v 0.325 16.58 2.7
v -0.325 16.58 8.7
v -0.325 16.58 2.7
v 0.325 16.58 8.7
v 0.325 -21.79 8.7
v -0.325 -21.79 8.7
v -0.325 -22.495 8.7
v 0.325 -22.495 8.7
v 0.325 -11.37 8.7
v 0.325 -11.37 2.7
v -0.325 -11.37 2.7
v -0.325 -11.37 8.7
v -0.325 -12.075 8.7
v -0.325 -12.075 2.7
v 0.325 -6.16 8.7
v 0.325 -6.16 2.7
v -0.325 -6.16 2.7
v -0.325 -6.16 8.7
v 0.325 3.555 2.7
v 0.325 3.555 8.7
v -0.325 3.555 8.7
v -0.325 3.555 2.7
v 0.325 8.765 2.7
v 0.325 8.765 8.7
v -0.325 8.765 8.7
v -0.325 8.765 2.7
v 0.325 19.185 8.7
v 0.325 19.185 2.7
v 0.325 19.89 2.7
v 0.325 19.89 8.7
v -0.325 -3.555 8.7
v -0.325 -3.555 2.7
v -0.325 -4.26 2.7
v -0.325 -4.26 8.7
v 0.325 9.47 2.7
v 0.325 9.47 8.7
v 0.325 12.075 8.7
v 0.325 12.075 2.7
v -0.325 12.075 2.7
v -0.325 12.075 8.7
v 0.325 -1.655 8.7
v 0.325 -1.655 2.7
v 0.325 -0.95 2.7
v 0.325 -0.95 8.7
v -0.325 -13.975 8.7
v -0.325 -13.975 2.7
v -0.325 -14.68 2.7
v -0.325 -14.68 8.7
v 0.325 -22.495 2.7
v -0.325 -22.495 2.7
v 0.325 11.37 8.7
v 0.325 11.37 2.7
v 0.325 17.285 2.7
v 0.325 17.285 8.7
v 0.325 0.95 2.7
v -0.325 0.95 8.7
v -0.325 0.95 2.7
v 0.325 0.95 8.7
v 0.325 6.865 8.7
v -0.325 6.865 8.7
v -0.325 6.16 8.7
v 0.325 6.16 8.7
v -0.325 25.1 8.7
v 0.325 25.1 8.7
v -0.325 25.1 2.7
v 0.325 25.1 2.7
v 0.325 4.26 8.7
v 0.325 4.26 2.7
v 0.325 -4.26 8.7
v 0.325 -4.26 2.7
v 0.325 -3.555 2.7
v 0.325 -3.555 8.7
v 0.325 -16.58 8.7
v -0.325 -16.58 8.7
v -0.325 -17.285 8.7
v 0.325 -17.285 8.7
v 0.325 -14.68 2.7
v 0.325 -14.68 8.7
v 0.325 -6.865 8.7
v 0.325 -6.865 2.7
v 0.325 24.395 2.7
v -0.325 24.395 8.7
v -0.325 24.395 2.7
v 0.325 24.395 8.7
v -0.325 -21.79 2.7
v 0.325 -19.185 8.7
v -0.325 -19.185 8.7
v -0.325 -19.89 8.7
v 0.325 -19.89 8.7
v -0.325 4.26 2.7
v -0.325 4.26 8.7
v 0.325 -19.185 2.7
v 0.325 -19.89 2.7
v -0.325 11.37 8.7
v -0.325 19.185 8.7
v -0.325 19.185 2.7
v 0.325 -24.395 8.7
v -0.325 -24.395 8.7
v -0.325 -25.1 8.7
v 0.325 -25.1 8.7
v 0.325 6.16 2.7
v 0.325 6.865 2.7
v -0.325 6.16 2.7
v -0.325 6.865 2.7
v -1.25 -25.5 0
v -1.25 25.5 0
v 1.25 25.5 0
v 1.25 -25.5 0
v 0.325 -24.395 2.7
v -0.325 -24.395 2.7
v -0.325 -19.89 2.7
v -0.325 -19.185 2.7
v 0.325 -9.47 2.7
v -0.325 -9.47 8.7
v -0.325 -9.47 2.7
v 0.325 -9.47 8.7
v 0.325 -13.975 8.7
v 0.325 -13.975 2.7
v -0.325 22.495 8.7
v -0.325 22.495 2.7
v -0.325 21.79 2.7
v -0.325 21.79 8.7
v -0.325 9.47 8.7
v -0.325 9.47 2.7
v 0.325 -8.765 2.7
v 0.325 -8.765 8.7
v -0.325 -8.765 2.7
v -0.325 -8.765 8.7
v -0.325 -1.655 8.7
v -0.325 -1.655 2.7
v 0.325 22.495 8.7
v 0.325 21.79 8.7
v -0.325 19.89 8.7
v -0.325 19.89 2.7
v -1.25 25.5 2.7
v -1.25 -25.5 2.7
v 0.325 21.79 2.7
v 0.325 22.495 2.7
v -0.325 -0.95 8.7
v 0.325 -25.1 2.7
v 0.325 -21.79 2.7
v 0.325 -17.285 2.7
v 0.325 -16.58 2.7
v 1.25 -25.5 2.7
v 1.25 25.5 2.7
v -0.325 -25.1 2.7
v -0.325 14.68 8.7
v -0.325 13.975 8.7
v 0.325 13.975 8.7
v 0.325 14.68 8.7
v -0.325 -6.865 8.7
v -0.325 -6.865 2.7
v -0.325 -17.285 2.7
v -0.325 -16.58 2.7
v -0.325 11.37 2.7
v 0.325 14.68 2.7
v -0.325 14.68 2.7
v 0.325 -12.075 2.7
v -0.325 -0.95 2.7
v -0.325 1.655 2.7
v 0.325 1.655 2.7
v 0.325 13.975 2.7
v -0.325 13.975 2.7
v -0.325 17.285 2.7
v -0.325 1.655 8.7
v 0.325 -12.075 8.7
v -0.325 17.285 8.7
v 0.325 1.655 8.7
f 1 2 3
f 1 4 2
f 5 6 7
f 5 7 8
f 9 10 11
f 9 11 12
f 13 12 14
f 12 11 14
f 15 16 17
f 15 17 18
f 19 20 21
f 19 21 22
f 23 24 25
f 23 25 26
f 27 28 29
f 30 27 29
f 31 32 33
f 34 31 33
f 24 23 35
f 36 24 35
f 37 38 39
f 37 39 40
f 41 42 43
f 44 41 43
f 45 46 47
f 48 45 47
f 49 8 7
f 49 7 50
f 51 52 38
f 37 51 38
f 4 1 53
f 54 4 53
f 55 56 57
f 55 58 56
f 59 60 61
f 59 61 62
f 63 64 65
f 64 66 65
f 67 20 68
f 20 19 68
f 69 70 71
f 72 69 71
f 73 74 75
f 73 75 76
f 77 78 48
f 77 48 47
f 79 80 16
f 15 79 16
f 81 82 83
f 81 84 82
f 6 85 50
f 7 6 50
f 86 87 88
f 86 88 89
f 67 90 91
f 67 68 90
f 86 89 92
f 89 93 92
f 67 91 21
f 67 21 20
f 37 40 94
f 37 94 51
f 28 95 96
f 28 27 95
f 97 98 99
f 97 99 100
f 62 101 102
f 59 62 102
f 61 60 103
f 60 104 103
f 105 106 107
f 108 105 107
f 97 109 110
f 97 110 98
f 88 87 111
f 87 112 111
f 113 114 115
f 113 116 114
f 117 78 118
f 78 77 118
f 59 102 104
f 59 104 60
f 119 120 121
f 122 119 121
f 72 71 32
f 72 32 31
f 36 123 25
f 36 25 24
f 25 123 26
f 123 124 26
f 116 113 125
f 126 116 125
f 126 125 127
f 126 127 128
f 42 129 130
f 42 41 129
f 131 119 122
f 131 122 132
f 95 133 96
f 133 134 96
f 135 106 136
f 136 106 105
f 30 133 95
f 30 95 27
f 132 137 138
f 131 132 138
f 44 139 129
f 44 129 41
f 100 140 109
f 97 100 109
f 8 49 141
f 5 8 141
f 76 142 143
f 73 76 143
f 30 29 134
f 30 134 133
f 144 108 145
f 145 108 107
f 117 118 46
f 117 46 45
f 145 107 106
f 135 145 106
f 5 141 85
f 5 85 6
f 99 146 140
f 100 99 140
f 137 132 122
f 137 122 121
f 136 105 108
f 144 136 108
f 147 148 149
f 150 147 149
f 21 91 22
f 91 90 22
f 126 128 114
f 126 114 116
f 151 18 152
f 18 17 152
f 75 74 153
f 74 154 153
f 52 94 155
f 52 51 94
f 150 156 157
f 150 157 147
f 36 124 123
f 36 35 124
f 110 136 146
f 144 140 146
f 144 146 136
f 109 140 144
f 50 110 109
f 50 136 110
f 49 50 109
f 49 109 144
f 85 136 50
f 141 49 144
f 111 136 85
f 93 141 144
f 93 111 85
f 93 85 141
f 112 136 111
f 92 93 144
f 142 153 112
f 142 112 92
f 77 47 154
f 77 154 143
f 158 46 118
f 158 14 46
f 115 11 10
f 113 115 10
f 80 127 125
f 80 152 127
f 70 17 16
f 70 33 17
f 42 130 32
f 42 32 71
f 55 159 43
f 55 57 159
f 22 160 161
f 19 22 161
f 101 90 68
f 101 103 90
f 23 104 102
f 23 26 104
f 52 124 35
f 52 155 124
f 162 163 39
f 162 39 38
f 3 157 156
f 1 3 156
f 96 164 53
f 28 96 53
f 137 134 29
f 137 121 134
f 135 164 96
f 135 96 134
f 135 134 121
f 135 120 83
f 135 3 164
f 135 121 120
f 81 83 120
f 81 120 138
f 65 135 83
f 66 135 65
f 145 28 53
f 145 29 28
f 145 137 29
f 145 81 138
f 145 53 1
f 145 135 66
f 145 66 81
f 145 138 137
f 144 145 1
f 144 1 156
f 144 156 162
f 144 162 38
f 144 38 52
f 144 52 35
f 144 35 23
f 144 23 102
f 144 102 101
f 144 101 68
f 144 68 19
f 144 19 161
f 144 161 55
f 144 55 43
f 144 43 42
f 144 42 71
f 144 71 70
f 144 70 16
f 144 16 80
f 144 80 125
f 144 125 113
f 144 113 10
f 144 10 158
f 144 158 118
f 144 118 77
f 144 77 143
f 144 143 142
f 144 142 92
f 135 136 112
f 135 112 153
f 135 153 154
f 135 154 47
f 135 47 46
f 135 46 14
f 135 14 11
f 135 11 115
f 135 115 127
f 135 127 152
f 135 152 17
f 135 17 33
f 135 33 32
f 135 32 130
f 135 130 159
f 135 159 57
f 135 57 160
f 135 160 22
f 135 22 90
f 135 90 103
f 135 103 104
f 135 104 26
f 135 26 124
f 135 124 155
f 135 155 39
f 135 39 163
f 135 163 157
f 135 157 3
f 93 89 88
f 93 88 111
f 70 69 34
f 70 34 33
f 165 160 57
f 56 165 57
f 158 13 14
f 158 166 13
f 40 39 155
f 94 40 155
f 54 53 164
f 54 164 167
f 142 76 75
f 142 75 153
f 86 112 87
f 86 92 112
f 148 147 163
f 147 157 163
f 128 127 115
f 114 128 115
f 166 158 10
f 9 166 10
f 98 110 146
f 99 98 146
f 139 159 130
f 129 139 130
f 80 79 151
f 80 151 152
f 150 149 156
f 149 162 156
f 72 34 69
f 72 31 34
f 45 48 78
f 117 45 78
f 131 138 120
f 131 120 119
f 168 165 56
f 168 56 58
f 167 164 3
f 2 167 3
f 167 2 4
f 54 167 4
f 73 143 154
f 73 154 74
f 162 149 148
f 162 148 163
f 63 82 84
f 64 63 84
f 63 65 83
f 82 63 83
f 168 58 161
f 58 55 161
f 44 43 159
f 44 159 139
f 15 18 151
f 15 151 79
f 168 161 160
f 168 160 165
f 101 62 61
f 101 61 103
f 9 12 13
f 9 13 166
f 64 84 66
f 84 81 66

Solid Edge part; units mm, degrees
sketch "Sketch1" plane through (0, 0, 0) normal (0, 0, 1) x (1, 0, 0)
  line L0 (-1.25, -25.5) -> (1.25, -25.5)
  line L1 (1.25, -25.5) -> (1.25, 25.5)
  line L2 (1.25, 25.5) -> (-1.25, 25.5)
  line L3 (-1.25, 25.5) -> (-1.25, -25.5)
  dimension "D1" = 2.5
  dimension "D2" = 51
extrude "Protrusion1" add sketch "Sketch1" along normal blind 2.7
sketch "Sketch2" plane through (0, 0, 2.7) normal (0, 0, 1) x (0, 1, 0)
  line L0 (-25.1, -0.325) -> (25.1, -0.325)
  line L1 (25.1, -0.325) -> (25.1, 0.325)
  line L2 (25.1, 0.325) -> (-25.1, 0.325)
  line L3 (-25.1, 0.325) -> (-25.1, -0.325)
  dimension "D1" = 0.65
  dimension "D2" = 50.2
extrude "Extrusionsausprägung_2" add sketch "Sketch2" along normal blind 6
sketch "Sketch3" plane through (0.325, 0, 5.7) normal (1, 0, 0) x (0, 1, 0)
  line L0 (-21.79, 3) -> (-19.89, 3)
  line L1 (-19.89, 3) -> (-19.89, -3)
  line L2 (-19.89, -3) -> (-21.79, -3)
  line L3 (-21.79, -3) -> (-21.79, 3)
  line L4 (-19.185, 3) -> (-17.285, 3)
  line L5 (-17.285, 3) -> (-17.285, -3)
  line L6 (-17.285, -3) -> (-19.185, -3)
  line L7 (-19.185, -3) -> (-19.185, 3)
  line L8 (-16.58, 3) -> (-14.68, 3)
  line L9 (-14.68, 3) -> (-14.68, -3)
  line L10 (-14.68, -3) -> (-16.58, -3)
  line L11 (-16.58, -3) -> (-16.58, 3)
  line L12 (-13.975, 3) -> (-12.075, 3)
  line L13 (-12.075, 3) -> (-12.075, -3)
  line L14 (-12.075, -3) -> (-13.975, -3)
  line L15 (-13.975, -3) -> (-13.975, 3)
  line L16 (-11.37, 3) -> (-9.47, 3)
  line L17 (-9.47, 3) -> (-9.47, -3)
  line L18 (-9.47, -3) -> (-11.37, -3)
  line L19 (-11.37, -3) -> (-11.37, 3)
  line L20 (-8.765, 3) -> (-6.865, 3)
  line L21 (-6.865, 3) -> (-6.865, -3)
  line L22 (-6.865, -3) -> (-8.765, -3)
  line L23 (-8.765, -3) -> (-8.765, 3)
  line L24 (-6.16, 3) -> (-4.26, 3)
  line L25 (-4.26, 3) -> (-4.26, -3)
  line L26 (-4.26, -3) -> (-6.16, -3)
  line L27 (-6.16, -3) -> (-6.16, 3)
  line L28 (-3.555, 3) -> (-1.655, 3)
  line L29 (-1.655, 3) -> (-1.655, -3)
  line L30 (-1.655, -3) -> (-3.555, -3)
  line L31 (-3.555, -3) -> (-3.555, 3)
  line L32 (-0.95, 3) -> (0.95, 3)
  line L33 (0.95, 3) -> (0.95, -3)
  line L34 (0.95, -3) -> (-0.95, -3)
  line L35 (-0.95, -3) -> (-0.95, 3)
  line L36 (-24.395, 3) -> (-22.495, 3)
  line L37 (-22.495, 3) -> (-22.495, -3)
  line L38 (-22.495, -3) -> (-24.395, -3)
  line L39 (-24.395, -3) -> (-24.395, 3)
  dimension "D1" = 0.705
  dimension "D2" = 1.9
extrude "Cutout1" cut sketch "Sketch3" against normal through all
mirror "Mirror1" about plane through (0, 0, 0) normal (0, -1, 0) of "Cutout1"
